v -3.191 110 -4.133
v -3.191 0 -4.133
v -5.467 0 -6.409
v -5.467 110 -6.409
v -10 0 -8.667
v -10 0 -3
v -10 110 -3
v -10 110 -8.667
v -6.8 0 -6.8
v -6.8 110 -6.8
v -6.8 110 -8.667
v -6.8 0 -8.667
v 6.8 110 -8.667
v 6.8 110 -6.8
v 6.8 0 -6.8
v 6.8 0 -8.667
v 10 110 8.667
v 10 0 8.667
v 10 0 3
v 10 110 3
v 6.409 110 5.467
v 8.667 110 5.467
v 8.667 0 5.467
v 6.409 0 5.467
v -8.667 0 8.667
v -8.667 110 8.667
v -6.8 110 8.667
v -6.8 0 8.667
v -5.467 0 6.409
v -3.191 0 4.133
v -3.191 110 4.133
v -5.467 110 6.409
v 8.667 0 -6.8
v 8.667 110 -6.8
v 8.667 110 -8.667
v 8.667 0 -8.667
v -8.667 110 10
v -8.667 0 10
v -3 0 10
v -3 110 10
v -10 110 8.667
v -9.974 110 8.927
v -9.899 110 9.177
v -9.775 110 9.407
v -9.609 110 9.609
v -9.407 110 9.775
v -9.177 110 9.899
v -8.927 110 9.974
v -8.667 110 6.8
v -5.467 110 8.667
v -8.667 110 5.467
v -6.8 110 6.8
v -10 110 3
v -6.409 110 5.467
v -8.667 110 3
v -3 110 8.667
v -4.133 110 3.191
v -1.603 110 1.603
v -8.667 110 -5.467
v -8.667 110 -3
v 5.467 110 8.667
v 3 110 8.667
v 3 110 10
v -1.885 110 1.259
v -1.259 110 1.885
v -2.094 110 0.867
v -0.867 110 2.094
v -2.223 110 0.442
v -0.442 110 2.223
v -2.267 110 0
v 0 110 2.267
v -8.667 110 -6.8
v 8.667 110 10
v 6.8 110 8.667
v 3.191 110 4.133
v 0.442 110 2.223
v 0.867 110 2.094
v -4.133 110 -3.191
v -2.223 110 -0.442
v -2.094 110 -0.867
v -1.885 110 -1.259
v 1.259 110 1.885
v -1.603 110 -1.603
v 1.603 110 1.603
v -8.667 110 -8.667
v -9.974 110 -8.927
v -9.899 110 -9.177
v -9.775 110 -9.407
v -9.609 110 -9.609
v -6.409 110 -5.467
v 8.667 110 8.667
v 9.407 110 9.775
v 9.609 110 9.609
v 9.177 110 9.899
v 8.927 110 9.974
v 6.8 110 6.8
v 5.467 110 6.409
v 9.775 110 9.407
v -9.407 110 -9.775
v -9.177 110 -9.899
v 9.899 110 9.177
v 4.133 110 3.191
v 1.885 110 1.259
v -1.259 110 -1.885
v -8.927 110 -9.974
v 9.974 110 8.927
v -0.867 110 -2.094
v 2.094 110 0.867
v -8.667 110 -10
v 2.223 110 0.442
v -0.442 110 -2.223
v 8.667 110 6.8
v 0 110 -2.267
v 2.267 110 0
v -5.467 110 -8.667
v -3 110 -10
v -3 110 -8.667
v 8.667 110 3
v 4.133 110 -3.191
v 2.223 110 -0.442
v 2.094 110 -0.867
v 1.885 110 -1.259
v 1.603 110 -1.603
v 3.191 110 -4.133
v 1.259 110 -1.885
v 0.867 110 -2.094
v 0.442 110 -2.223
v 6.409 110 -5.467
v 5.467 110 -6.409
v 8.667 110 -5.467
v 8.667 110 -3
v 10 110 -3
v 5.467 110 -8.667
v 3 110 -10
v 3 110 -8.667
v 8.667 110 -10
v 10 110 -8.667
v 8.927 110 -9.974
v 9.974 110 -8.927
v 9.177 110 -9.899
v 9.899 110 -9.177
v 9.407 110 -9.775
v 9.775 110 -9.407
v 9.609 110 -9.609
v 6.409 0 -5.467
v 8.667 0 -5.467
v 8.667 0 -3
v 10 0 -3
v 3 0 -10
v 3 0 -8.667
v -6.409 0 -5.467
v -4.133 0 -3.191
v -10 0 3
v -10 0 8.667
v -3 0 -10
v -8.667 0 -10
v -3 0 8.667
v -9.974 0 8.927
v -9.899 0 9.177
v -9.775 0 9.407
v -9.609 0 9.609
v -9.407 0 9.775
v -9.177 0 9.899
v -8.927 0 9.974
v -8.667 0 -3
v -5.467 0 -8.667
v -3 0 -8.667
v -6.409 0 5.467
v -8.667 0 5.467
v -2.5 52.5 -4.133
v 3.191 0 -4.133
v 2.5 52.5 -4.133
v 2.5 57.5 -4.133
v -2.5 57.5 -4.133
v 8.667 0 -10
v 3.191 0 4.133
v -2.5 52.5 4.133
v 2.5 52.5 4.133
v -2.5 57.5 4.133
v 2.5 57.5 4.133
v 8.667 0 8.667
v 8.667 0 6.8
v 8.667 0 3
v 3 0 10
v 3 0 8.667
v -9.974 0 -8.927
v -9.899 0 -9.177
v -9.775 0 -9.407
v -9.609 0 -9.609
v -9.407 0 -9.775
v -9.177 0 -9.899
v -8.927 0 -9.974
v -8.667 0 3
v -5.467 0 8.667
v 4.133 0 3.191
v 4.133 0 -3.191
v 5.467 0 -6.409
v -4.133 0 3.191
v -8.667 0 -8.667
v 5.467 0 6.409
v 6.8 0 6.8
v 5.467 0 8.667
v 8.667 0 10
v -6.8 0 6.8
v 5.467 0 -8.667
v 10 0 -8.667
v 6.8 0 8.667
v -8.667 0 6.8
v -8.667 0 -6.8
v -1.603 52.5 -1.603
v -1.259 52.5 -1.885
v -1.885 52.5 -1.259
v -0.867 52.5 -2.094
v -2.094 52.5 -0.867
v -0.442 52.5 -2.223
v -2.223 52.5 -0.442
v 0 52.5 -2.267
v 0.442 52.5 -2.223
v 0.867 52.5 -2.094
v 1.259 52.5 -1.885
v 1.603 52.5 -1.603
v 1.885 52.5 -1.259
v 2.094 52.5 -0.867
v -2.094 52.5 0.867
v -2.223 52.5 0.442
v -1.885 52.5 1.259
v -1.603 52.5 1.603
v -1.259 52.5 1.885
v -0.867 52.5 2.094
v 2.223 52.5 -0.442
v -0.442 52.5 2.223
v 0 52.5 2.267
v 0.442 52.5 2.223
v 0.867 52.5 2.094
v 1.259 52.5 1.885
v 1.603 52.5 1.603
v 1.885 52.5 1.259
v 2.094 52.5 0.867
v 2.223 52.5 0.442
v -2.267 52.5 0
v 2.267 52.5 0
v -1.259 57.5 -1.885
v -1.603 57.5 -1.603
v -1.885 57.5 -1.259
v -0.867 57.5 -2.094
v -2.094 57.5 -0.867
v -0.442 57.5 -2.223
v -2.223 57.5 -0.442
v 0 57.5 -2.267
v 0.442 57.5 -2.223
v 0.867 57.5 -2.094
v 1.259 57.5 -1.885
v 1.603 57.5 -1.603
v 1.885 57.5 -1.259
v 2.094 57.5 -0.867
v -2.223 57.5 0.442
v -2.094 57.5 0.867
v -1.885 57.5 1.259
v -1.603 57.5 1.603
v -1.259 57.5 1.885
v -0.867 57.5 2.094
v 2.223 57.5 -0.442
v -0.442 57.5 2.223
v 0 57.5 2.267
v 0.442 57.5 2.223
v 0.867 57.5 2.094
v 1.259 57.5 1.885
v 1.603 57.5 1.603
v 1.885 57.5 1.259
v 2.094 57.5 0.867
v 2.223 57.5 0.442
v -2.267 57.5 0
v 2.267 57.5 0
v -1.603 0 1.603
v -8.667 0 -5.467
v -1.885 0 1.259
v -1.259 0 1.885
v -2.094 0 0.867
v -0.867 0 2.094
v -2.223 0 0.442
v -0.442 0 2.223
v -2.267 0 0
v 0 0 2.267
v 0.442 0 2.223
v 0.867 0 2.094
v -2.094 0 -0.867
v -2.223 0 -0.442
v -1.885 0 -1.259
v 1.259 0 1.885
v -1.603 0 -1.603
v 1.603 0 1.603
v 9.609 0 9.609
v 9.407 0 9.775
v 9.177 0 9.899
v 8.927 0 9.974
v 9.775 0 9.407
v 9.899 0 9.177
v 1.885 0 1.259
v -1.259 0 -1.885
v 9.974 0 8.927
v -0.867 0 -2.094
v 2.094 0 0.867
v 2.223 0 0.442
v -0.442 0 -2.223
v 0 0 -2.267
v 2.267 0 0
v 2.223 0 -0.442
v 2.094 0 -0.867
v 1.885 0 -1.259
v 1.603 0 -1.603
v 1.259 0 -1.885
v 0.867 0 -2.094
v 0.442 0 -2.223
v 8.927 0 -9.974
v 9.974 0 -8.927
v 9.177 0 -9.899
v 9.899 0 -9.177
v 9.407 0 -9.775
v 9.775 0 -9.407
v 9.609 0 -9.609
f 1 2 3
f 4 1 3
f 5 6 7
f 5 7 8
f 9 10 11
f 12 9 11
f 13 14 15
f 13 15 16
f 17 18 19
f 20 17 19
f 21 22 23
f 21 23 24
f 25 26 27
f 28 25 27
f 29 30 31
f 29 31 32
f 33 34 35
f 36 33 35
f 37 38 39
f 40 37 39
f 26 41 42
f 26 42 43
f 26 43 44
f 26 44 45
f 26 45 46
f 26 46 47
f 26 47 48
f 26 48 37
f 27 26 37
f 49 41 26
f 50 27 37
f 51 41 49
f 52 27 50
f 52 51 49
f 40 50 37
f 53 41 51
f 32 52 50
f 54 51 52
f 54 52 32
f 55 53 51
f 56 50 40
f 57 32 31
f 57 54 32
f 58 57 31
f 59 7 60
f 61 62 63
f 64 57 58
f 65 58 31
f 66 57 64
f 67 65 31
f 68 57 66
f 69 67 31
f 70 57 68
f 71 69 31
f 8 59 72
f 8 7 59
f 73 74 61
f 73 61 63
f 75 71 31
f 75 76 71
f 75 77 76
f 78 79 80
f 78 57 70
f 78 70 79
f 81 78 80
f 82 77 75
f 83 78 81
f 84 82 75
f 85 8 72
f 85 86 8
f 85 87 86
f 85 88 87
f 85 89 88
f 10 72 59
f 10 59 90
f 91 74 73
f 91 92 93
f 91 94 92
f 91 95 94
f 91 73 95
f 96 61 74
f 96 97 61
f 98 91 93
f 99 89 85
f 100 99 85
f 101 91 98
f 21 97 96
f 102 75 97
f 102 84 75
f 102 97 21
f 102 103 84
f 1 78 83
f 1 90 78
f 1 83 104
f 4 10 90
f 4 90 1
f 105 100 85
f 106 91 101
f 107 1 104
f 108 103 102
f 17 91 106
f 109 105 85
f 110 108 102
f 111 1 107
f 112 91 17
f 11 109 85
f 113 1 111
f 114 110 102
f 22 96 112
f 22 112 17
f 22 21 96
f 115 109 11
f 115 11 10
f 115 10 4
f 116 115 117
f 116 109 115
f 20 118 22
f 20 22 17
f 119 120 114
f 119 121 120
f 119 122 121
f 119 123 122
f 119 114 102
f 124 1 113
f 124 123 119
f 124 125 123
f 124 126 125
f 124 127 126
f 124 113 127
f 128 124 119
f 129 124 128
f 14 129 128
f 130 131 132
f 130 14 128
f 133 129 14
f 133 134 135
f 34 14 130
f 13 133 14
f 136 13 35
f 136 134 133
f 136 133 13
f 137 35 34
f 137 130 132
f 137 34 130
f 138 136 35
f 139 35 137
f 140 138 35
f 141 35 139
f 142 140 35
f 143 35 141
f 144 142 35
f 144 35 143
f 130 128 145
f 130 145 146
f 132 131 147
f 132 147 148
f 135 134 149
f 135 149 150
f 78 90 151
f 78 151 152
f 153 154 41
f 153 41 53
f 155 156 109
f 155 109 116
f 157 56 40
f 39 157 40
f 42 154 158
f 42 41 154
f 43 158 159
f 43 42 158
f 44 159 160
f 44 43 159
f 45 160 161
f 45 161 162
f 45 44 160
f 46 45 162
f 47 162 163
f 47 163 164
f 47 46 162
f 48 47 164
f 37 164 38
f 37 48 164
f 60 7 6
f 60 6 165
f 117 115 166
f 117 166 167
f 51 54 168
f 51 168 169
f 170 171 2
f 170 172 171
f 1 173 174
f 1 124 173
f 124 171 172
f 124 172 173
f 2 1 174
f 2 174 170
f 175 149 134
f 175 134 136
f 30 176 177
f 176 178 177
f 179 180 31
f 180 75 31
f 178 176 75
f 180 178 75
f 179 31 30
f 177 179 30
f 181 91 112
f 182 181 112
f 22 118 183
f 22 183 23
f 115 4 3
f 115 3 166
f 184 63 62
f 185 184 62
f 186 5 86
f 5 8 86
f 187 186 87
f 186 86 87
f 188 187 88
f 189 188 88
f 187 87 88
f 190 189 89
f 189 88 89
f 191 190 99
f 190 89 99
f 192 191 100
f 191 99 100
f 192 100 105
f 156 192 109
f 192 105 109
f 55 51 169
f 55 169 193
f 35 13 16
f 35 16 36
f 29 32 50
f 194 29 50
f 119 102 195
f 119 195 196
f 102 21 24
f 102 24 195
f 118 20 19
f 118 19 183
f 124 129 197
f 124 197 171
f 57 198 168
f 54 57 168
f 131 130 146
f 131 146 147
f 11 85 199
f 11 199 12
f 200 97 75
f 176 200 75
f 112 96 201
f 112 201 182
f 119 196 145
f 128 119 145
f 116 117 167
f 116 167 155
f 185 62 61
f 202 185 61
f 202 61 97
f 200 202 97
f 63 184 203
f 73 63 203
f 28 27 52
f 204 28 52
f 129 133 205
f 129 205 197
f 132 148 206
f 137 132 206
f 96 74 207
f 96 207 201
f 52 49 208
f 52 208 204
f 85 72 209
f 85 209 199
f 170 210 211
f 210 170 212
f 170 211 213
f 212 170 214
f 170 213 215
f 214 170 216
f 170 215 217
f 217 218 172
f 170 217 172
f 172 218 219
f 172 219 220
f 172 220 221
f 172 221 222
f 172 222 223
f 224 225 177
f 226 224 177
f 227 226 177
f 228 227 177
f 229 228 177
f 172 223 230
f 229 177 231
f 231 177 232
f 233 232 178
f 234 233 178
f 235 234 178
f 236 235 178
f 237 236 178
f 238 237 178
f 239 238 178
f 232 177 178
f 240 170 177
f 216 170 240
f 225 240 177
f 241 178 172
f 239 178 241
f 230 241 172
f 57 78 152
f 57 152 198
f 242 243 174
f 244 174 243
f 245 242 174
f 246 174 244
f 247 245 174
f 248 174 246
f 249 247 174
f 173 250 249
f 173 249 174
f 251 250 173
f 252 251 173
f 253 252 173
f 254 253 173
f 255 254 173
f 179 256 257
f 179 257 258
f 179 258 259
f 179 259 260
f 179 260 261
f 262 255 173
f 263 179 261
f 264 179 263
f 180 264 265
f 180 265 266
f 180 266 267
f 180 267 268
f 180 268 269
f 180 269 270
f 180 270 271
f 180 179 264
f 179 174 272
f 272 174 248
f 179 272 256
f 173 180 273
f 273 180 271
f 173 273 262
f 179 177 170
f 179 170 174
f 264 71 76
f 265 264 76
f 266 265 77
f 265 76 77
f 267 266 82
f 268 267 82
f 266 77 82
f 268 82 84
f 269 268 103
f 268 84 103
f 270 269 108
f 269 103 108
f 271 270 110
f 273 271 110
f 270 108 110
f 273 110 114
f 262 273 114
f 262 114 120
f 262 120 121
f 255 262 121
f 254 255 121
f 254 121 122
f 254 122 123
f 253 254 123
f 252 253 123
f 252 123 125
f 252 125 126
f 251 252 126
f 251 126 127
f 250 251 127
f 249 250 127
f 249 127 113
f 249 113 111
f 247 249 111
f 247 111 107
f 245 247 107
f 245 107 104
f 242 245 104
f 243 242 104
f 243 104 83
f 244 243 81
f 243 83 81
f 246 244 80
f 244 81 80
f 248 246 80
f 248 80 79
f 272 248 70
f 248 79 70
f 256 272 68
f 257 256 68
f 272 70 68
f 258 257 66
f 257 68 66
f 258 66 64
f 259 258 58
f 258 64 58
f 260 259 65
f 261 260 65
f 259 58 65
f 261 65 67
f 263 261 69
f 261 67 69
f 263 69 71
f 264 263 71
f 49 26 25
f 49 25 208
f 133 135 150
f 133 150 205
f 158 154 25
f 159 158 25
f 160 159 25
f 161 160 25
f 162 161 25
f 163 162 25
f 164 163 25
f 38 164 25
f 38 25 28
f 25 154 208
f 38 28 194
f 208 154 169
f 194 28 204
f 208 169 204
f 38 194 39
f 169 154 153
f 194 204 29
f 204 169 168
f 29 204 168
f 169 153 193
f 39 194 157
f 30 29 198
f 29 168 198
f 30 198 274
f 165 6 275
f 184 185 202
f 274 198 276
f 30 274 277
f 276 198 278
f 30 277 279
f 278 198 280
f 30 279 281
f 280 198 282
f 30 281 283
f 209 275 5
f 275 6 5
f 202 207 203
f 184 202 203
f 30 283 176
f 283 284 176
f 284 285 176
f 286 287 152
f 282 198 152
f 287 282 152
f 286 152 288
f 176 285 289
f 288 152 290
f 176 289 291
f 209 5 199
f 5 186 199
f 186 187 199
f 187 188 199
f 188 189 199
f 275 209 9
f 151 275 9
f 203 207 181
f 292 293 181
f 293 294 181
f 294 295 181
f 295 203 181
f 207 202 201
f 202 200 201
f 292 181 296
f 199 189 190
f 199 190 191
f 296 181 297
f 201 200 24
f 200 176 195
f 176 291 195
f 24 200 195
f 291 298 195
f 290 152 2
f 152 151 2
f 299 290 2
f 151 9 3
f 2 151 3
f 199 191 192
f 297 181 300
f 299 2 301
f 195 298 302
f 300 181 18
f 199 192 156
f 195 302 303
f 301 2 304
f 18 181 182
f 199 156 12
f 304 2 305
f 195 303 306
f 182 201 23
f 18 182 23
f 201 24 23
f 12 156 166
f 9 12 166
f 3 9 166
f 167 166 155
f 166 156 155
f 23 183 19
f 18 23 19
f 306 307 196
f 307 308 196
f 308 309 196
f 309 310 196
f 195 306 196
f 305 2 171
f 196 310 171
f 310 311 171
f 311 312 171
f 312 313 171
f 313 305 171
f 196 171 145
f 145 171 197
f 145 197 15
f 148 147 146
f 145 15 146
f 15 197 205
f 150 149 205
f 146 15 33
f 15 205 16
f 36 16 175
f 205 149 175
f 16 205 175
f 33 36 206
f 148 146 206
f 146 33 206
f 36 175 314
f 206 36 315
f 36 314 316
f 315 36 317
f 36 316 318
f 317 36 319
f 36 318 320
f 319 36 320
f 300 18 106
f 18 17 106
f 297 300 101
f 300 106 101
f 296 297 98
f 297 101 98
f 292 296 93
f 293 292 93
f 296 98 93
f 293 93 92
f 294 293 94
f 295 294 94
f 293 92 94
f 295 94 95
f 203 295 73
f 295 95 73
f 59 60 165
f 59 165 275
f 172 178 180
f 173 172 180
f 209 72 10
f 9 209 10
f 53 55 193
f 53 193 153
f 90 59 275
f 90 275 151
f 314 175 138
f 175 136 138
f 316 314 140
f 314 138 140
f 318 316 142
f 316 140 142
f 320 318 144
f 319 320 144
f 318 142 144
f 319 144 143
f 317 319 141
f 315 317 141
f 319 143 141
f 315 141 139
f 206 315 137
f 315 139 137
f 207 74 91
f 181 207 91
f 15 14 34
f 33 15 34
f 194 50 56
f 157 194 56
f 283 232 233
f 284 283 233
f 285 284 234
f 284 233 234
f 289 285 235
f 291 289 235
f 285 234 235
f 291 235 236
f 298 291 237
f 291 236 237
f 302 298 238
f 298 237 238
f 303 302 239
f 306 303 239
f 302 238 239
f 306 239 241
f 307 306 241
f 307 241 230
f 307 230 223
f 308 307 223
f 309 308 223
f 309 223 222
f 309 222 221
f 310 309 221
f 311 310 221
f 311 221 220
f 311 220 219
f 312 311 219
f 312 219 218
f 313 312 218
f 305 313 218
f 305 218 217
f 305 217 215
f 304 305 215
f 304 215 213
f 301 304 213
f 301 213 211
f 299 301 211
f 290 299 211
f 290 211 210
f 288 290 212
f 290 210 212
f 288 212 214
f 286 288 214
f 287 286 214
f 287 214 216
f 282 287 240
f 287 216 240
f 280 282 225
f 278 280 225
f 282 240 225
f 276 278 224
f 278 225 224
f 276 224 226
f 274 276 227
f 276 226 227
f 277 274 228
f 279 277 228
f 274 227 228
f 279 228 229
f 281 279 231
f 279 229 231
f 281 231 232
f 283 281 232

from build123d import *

# Parameters (mm, degrees)
SKETCH1_W           = 20
SKETCH1_H           = 20
EXTRUDE1_DEPTH      = 110
SKETCH2_R           = 2.266666667
SKETCH2_W           = 1.866666667
SKETCH2_H           = 1.866666667
EXTRUDE2_DEPTH      = 111.905365064
FILLET1_R           = 1.333333333
SKETCH_3_W          = 5
SKETCH_3_H          = 5
CUT_EXTRUDE_1_DEPTH = 10


with BuildPart() as part:
    # Sketch1 → Extrude1 (new body)
    with BuildSketch(Plane(origin=(0, 0, 0), x_dir=(1, 0, 0), z_dir=(0, 1, 0))):
        Rectangle(SKETCH1_W, SKETCH1_H)
    extrude(amount=EXTRUDE1_DEPTH)

    # Sketch2 → Extrude2 (cut, through all)
    with BuildSketch(Plane(origin=(0, 110, 0), x_dir=(1, 0, 0), z_dir=(0, 1, 0))):
        Circle(SKETCH2_R)
        Polygon((8.666666667, 3), (11.333333333, 3), (11.333333333, -3), (8.666666667, -3), (8.666666667, -5.466666667), (6.409475708, -5.466666667), (4.133333333, -3.190524292), (4.133333333, 3.190524292), (6.409475708, 5.466666667), (8.666666667, 5.466666667), align=None)
        with Locations((7.733333334, 7.733333334)):
            Rectangle(SKETCH2_W, SKETCH2_H)
        Polygon((-3.190524292, 4.133333333), (-5.466666667, 6.409475708), (-5.466666667, 8.666666667), (-3, 8.666666667), (-3, 11.333333333), (3, 11.333333333), (3, 8.666666667), (5.466666667, 8.666666667), (5.466666667, 6.409475708), (3.190524292, 4.133333333), align=None)
        with Locations((7.733333334, -7.733333334)):
            Rectangle(SKETCH2_W, SKETCH2_H)
        with Locations((-7.733333334, 7.733333334)):
            Rectangle(SKETCH2_W, SKETCH2_H)
        with Locations((-7.733333334, -7.733333334)):
            Rectangle(SKETCH2_W, SKETCH2_H)
        Polygon((-6.409475708, -5.466666667), (-8.666666667, -5.466666667), (-8.666666667, -3), (-11.333333333, -3), (-11.333333333, 3), (-8.666666667, 3), (-8.666666667, 5.466666667), (-6.409475708, 5.466666667), (-4.133333333, 3.190524292), (-4.133333333, -3.190524292), align=None)
        Polygon((3.190524292, -4.133333333), (-3.190524292, -4.133333333), (-5.466666667, -6.409475708), (-5.466666667, -8.666666667), (-3, -8.666666667), (-3, -11.333333333), (3, -11.333333333), (3, -8.666666667), (5.466666667, -8.666666667), (5.466666667, -6.409475708), align=None)
    extrude(amount=-EXTRUDE2_DEPTH, mode=Mode.SUBTRACT)

    # Fillet1
    fillet1_edges = [part.edges().sort_by_distance(p)[0] for p in [
        (10, 55, 10),
        (10, 55, -10),
        (-10, 55, 10),
        (-10, 55, -10),
    ]]
    fillet(fillet1_edges, radius=FILLET1_R)

    # Эскиз3 → Вырез-Вытянуть1 (cut, symmetric)
    with BuildSketch(Plane.XY):
        with Locations((0, 55)):
            Rectangle(SKETCH_3_W, SKETCH_3_H)
    extrude(amount=CUT_EXTRUDE_1_DEPTH, both=True, mode=Mode.SUBTRACT)


solid = part.part
